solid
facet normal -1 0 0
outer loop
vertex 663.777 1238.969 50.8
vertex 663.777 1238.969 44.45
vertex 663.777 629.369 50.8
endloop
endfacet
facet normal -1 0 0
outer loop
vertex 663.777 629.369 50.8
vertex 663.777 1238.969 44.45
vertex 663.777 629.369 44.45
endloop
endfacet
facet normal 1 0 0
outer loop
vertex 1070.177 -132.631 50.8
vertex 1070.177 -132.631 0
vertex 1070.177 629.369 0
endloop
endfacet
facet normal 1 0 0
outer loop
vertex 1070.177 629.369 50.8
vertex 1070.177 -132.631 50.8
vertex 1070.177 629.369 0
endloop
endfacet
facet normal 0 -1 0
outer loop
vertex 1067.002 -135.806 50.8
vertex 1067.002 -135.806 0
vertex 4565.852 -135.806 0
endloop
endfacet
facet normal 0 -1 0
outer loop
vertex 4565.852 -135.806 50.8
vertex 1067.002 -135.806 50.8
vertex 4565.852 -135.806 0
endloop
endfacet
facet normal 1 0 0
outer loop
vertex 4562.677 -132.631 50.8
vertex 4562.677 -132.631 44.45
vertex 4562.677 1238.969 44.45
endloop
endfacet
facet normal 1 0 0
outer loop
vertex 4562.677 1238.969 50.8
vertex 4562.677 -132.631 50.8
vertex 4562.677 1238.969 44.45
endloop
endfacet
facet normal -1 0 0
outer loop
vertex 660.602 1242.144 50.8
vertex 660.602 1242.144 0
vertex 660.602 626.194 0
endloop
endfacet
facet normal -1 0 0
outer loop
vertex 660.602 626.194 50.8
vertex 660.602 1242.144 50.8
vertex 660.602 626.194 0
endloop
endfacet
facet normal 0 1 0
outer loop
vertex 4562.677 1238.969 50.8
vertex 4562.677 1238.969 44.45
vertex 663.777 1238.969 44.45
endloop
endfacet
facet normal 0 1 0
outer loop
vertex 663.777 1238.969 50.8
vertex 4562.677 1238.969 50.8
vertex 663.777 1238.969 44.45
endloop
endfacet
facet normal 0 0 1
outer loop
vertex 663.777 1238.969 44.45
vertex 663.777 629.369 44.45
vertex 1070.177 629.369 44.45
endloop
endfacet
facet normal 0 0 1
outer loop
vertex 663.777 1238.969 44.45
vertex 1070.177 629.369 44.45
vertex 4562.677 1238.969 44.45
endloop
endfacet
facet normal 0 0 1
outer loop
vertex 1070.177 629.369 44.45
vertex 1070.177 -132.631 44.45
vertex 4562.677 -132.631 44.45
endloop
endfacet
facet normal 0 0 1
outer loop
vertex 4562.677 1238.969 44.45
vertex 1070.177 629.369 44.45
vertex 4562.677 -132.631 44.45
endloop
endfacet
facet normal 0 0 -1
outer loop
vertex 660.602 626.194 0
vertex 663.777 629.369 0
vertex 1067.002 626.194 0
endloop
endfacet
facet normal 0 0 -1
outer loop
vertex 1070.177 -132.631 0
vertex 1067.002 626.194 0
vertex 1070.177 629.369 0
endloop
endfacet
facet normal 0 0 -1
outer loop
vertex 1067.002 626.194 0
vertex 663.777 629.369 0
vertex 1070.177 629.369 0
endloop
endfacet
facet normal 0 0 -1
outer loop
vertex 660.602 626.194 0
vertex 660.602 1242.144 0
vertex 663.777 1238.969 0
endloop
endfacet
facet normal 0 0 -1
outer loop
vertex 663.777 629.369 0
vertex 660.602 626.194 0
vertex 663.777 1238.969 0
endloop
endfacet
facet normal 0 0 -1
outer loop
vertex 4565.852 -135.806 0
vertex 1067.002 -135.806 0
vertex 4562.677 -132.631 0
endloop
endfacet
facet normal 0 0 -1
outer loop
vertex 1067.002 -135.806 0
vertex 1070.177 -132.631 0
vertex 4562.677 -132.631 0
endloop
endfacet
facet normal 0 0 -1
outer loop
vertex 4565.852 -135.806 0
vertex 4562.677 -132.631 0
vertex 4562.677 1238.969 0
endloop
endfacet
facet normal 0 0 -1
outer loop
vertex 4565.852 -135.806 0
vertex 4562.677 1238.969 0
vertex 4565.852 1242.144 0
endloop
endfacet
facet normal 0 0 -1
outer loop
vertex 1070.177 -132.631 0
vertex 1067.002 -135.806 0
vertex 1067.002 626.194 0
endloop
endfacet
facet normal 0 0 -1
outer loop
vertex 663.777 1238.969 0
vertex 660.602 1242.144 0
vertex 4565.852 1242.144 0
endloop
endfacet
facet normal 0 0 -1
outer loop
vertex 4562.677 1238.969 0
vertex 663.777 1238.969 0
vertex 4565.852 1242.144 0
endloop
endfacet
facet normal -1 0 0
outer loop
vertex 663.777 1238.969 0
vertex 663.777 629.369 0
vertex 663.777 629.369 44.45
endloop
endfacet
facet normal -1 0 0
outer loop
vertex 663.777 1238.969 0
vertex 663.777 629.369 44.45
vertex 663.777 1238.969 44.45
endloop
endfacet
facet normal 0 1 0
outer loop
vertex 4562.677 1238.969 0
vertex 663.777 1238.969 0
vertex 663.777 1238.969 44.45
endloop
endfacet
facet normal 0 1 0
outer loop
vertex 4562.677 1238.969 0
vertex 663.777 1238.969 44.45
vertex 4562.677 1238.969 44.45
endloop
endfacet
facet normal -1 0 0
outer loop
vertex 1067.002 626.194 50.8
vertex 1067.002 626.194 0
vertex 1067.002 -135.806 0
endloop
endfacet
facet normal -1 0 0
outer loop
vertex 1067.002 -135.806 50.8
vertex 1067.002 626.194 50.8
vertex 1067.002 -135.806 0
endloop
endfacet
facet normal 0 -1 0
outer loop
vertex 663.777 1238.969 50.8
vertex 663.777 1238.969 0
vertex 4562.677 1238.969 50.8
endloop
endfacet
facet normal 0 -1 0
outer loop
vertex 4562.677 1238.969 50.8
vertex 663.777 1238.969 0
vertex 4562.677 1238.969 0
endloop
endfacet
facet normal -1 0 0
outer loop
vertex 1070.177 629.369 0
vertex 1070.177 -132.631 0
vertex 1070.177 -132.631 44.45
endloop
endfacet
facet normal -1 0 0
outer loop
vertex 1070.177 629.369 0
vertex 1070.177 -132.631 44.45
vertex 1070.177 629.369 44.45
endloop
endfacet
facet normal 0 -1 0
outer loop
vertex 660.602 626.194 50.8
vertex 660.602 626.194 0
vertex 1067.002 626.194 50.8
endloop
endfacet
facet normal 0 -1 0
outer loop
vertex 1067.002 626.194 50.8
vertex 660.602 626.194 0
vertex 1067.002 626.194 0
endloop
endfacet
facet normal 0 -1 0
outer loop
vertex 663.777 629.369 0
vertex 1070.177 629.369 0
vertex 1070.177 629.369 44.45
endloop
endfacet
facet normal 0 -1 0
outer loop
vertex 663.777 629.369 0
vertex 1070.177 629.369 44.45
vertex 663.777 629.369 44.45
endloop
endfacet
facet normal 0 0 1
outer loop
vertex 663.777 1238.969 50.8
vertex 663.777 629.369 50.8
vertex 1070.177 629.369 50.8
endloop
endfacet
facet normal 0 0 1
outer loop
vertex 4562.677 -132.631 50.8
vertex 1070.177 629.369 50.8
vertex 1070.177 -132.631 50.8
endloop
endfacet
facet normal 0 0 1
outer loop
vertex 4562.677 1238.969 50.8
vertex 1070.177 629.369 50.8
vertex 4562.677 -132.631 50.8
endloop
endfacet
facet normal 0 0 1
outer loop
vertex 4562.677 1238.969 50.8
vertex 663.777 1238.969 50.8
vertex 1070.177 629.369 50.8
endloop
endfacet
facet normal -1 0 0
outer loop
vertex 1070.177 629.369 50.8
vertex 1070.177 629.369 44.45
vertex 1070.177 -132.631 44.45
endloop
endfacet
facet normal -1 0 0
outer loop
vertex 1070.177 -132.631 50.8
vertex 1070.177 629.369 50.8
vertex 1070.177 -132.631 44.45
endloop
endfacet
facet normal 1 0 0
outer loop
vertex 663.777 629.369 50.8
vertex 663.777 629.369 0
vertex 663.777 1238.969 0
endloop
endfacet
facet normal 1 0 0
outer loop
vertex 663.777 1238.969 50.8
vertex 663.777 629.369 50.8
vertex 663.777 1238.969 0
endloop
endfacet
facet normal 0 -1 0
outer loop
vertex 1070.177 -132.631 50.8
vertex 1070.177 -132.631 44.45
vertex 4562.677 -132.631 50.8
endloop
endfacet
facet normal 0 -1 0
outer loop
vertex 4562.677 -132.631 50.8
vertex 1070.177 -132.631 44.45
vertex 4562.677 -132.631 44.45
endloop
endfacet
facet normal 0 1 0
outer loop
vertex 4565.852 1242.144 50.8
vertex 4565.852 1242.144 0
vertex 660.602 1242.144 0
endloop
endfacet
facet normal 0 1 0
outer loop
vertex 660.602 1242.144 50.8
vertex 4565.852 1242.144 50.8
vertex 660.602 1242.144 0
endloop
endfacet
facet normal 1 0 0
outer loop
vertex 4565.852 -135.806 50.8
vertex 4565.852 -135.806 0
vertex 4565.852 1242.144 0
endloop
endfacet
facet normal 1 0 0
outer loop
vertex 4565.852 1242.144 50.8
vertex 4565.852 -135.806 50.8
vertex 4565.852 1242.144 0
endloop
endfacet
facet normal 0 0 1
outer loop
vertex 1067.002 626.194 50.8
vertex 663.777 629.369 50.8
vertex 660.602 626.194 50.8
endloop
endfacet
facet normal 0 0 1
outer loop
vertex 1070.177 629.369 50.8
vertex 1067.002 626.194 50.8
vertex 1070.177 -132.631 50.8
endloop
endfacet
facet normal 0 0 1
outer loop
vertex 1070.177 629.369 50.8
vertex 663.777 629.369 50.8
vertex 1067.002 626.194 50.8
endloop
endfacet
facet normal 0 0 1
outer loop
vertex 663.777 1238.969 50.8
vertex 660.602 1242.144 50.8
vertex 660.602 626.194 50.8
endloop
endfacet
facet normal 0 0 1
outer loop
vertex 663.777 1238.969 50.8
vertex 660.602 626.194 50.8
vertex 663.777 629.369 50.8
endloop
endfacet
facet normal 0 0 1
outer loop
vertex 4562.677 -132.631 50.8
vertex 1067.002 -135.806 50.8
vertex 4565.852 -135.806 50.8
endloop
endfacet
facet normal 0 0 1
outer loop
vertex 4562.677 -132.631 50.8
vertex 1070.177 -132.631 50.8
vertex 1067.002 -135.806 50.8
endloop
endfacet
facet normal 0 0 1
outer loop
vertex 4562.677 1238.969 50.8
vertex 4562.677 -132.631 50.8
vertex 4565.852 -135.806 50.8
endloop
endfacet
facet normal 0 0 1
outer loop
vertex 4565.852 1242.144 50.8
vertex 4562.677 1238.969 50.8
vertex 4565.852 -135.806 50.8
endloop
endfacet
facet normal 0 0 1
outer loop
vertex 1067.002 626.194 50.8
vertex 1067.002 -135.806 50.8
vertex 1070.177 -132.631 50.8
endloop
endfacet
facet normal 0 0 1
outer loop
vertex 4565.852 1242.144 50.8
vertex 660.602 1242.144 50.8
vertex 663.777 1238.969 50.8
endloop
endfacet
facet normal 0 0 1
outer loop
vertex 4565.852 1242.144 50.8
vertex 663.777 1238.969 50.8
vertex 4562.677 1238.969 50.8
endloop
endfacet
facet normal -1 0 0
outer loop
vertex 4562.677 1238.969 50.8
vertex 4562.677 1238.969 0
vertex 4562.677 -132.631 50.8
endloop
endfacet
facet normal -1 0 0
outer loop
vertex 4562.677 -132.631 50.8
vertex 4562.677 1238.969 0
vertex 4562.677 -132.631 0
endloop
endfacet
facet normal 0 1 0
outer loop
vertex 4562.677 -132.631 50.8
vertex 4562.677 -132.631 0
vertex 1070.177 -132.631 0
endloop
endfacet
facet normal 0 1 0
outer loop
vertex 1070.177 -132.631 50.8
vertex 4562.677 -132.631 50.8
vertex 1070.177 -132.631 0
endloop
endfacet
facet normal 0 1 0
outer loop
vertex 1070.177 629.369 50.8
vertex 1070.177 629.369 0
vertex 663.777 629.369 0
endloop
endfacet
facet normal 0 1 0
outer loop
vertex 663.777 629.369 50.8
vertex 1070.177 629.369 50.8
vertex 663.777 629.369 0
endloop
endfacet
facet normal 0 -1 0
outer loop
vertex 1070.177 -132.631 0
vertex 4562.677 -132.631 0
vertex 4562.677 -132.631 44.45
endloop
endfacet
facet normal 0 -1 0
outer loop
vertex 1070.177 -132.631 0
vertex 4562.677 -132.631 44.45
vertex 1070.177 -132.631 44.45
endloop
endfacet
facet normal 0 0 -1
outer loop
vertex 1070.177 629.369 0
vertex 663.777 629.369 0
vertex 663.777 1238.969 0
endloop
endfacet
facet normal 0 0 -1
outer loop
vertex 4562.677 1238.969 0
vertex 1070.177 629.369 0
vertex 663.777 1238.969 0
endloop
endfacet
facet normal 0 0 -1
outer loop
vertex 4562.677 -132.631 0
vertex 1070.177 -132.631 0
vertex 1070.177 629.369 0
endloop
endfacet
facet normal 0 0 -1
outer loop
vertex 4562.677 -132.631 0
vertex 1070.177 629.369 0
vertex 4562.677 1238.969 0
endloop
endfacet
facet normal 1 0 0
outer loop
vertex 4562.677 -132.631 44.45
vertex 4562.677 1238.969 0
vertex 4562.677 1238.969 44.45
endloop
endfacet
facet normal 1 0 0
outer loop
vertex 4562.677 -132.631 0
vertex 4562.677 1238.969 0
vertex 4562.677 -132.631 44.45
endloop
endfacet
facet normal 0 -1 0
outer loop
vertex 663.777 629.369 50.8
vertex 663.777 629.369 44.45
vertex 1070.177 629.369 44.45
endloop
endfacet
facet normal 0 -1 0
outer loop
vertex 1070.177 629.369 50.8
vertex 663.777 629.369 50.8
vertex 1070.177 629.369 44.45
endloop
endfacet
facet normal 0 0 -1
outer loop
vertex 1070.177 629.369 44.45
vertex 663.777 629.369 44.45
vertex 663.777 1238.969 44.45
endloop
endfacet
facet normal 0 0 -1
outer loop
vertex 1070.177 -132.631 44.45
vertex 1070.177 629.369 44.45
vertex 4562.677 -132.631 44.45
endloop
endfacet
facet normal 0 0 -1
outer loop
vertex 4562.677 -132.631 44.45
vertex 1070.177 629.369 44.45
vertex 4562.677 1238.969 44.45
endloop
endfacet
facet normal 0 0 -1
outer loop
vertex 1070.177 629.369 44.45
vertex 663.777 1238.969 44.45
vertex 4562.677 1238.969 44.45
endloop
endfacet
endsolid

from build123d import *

# Parameters (mm, degrees)
F1_DEPTH = 50.8
F3_DEPTH = 44.45
F5_DEPTH = 6.35


with BuildPart() as f1:
    # F0 (on Top) → F1 (new body)
    with BuildSketch(Plane.XY):
        Polygon((660.602378, 1242.14413), (660.602378, 626.19413), (1067.002378, 626.19413), (1067.002378, -135.80587), (4565.852378, -135.80587), (4565.852378, 1242.14413), align=None)
        Polygon((4562.677378, -132.63087), (1070.177378, -132.63087), (1070.177378, 629.36913), (663.777378, 629.36913), (663.777378, 1238.96913), (4562.677378, 1238.96913), align=None, mode=Mode.SUBTRACT)
    extrude(amount=F1_DEPTH)


with BuildPart() as f3:
    # F2 (on face) → F3 (new body)
    with BuildSketch(Plane(origin=(0, 0, 0), x_dir=(1, 0, 0), z_dir=(0, 0, -1))):
        Polygon((1070.177378, -629.36913), (663.777378, -629.36913), (663.777378, -1238.96913), (4562.677378, -1238.96913), (4562.677378, 132.63087), (1070.177378, 132.63087), align=None)
    extrude(amount=-F3_DEPTH)


with BuildPart() as f5:
    # F4 (on face) → F5 (new body)
    with BuildSketch(Plane.XY.offset(44.45)):
        Polygon((4562.677378, 1238.96913), (663.777378, 1238.96913), (663.777378, 629.36913), (1070.177378, 629.36913), (1070.177378, -132.63087), (4562.677378, -132.63087), align=None)
    extrude(amount=F5_DEPTH)


solid = Compound([f1.part, f3.part, f5.part])
